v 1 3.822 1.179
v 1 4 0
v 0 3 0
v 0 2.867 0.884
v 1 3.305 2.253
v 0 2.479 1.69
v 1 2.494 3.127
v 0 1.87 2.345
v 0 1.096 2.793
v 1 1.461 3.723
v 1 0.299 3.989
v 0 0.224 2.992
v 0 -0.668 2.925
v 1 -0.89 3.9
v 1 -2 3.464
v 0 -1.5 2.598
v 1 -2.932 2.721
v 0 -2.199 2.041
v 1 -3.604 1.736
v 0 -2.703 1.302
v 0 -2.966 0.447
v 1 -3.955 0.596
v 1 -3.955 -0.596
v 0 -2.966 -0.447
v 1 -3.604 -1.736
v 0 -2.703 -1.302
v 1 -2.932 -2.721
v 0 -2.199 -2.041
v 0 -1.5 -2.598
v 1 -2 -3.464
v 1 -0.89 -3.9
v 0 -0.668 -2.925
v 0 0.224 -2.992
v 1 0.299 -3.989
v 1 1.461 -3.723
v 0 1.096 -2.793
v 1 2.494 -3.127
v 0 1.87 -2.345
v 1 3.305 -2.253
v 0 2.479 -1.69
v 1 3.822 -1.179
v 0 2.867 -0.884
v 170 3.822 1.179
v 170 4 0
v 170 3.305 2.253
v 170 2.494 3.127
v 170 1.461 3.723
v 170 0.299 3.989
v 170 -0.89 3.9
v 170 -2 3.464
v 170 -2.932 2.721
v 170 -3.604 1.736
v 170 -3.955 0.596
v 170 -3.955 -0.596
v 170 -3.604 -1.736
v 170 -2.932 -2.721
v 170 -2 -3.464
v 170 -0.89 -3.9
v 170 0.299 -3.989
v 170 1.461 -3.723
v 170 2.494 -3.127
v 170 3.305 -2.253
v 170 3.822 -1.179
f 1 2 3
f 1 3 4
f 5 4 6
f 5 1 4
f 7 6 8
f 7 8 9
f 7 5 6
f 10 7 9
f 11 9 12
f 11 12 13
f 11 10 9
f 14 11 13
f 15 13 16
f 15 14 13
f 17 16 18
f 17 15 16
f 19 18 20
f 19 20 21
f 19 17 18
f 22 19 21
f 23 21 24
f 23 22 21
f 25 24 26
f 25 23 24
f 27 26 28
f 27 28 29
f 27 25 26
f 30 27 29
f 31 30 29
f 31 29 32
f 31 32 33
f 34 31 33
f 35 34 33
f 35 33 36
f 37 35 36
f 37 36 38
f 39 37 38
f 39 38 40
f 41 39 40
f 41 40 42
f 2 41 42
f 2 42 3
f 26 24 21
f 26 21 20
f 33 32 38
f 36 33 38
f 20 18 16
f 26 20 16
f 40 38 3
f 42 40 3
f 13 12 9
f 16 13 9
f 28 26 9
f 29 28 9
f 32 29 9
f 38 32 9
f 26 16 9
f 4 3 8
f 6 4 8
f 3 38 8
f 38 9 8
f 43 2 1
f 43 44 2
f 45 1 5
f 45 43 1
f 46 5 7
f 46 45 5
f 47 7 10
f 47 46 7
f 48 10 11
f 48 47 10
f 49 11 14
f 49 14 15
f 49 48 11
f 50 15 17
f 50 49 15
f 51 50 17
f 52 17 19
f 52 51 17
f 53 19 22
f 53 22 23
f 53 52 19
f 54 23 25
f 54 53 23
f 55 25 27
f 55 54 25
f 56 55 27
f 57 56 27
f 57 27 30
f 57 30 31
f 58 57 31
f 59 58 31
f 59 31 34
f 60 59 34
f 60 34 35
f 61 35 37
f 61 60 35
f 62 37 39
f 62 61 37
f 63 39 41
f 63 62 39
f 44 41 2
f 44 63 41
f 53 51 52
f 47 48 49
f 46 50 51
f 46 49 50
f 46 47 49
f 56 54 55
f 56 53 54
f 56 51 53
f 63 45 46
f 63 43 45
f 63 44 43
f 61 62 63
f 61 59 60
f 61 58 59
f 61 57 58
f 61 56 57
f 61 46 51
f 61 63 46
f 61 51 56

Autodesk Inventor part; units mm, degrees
ref_plane "Płaszczyzna początkowa" through (0, 0, 0) normal (1, 0, 0) x (0, 1, 0)
ref_plane "XZ Plane" through (0, 0, 0) normal (0, 1, 0) x (-1, 0, 0)
ref_plane "XY Plane" through (0, 0, 0) normal (0, 0, 1) x (1, 0, 0)
sketch "Szkic główny" plane through (0, 0, 0) normal (0, 0, 1) x (1, 0, 0)
  line L0 (0, 0) -> (337, 0)
  line L1 (0, 0) -> (0, 4)
  line L2 (337, 4) -> (337, 0)
  line L3 (0, 4) -> (337, 4)
  dimension "d3" = 8
revolve "Obrót1" add sketch "Szkic główny" angle 360 about axis through (0, 0, 0) along (1, 0, 0)
thread "Gwint1" size "M8x1.25" class "6g" standard "ANSI Metric M Profile" full length
chamfer "Faza1" distance 1 angle 45 2 edges at (0, -4, 0) (337, -4, 0)
sketch "Sketch3" plane through (337, 0, 0) normal (1, 0, 0) x (0, 0, -1)
  circle A0 centre (0, 0) radius 4 projected
  circle A1 centre (0, 0) radius 3 projected
  circle A2 centre (0, 0) radius 3 projected
extrude "Extrusion1" add sketch "Sketch3" along normal blind 13 and the other way blind 1 contours A0 | A1
sketch "Boceto4" plane through (350, 0, 0) normal (1, 0, 0) x (0, 0, -1)
  circle A0 centre (0, 0) radius 3 projected
  circle A1 centre (0, 0) radius 14.4832
extrude "Extrusión2" cut sketch "Boceto4" against normal blind 180 contours A0 | A1
properties part number "ACMEThread" material "Steel"
